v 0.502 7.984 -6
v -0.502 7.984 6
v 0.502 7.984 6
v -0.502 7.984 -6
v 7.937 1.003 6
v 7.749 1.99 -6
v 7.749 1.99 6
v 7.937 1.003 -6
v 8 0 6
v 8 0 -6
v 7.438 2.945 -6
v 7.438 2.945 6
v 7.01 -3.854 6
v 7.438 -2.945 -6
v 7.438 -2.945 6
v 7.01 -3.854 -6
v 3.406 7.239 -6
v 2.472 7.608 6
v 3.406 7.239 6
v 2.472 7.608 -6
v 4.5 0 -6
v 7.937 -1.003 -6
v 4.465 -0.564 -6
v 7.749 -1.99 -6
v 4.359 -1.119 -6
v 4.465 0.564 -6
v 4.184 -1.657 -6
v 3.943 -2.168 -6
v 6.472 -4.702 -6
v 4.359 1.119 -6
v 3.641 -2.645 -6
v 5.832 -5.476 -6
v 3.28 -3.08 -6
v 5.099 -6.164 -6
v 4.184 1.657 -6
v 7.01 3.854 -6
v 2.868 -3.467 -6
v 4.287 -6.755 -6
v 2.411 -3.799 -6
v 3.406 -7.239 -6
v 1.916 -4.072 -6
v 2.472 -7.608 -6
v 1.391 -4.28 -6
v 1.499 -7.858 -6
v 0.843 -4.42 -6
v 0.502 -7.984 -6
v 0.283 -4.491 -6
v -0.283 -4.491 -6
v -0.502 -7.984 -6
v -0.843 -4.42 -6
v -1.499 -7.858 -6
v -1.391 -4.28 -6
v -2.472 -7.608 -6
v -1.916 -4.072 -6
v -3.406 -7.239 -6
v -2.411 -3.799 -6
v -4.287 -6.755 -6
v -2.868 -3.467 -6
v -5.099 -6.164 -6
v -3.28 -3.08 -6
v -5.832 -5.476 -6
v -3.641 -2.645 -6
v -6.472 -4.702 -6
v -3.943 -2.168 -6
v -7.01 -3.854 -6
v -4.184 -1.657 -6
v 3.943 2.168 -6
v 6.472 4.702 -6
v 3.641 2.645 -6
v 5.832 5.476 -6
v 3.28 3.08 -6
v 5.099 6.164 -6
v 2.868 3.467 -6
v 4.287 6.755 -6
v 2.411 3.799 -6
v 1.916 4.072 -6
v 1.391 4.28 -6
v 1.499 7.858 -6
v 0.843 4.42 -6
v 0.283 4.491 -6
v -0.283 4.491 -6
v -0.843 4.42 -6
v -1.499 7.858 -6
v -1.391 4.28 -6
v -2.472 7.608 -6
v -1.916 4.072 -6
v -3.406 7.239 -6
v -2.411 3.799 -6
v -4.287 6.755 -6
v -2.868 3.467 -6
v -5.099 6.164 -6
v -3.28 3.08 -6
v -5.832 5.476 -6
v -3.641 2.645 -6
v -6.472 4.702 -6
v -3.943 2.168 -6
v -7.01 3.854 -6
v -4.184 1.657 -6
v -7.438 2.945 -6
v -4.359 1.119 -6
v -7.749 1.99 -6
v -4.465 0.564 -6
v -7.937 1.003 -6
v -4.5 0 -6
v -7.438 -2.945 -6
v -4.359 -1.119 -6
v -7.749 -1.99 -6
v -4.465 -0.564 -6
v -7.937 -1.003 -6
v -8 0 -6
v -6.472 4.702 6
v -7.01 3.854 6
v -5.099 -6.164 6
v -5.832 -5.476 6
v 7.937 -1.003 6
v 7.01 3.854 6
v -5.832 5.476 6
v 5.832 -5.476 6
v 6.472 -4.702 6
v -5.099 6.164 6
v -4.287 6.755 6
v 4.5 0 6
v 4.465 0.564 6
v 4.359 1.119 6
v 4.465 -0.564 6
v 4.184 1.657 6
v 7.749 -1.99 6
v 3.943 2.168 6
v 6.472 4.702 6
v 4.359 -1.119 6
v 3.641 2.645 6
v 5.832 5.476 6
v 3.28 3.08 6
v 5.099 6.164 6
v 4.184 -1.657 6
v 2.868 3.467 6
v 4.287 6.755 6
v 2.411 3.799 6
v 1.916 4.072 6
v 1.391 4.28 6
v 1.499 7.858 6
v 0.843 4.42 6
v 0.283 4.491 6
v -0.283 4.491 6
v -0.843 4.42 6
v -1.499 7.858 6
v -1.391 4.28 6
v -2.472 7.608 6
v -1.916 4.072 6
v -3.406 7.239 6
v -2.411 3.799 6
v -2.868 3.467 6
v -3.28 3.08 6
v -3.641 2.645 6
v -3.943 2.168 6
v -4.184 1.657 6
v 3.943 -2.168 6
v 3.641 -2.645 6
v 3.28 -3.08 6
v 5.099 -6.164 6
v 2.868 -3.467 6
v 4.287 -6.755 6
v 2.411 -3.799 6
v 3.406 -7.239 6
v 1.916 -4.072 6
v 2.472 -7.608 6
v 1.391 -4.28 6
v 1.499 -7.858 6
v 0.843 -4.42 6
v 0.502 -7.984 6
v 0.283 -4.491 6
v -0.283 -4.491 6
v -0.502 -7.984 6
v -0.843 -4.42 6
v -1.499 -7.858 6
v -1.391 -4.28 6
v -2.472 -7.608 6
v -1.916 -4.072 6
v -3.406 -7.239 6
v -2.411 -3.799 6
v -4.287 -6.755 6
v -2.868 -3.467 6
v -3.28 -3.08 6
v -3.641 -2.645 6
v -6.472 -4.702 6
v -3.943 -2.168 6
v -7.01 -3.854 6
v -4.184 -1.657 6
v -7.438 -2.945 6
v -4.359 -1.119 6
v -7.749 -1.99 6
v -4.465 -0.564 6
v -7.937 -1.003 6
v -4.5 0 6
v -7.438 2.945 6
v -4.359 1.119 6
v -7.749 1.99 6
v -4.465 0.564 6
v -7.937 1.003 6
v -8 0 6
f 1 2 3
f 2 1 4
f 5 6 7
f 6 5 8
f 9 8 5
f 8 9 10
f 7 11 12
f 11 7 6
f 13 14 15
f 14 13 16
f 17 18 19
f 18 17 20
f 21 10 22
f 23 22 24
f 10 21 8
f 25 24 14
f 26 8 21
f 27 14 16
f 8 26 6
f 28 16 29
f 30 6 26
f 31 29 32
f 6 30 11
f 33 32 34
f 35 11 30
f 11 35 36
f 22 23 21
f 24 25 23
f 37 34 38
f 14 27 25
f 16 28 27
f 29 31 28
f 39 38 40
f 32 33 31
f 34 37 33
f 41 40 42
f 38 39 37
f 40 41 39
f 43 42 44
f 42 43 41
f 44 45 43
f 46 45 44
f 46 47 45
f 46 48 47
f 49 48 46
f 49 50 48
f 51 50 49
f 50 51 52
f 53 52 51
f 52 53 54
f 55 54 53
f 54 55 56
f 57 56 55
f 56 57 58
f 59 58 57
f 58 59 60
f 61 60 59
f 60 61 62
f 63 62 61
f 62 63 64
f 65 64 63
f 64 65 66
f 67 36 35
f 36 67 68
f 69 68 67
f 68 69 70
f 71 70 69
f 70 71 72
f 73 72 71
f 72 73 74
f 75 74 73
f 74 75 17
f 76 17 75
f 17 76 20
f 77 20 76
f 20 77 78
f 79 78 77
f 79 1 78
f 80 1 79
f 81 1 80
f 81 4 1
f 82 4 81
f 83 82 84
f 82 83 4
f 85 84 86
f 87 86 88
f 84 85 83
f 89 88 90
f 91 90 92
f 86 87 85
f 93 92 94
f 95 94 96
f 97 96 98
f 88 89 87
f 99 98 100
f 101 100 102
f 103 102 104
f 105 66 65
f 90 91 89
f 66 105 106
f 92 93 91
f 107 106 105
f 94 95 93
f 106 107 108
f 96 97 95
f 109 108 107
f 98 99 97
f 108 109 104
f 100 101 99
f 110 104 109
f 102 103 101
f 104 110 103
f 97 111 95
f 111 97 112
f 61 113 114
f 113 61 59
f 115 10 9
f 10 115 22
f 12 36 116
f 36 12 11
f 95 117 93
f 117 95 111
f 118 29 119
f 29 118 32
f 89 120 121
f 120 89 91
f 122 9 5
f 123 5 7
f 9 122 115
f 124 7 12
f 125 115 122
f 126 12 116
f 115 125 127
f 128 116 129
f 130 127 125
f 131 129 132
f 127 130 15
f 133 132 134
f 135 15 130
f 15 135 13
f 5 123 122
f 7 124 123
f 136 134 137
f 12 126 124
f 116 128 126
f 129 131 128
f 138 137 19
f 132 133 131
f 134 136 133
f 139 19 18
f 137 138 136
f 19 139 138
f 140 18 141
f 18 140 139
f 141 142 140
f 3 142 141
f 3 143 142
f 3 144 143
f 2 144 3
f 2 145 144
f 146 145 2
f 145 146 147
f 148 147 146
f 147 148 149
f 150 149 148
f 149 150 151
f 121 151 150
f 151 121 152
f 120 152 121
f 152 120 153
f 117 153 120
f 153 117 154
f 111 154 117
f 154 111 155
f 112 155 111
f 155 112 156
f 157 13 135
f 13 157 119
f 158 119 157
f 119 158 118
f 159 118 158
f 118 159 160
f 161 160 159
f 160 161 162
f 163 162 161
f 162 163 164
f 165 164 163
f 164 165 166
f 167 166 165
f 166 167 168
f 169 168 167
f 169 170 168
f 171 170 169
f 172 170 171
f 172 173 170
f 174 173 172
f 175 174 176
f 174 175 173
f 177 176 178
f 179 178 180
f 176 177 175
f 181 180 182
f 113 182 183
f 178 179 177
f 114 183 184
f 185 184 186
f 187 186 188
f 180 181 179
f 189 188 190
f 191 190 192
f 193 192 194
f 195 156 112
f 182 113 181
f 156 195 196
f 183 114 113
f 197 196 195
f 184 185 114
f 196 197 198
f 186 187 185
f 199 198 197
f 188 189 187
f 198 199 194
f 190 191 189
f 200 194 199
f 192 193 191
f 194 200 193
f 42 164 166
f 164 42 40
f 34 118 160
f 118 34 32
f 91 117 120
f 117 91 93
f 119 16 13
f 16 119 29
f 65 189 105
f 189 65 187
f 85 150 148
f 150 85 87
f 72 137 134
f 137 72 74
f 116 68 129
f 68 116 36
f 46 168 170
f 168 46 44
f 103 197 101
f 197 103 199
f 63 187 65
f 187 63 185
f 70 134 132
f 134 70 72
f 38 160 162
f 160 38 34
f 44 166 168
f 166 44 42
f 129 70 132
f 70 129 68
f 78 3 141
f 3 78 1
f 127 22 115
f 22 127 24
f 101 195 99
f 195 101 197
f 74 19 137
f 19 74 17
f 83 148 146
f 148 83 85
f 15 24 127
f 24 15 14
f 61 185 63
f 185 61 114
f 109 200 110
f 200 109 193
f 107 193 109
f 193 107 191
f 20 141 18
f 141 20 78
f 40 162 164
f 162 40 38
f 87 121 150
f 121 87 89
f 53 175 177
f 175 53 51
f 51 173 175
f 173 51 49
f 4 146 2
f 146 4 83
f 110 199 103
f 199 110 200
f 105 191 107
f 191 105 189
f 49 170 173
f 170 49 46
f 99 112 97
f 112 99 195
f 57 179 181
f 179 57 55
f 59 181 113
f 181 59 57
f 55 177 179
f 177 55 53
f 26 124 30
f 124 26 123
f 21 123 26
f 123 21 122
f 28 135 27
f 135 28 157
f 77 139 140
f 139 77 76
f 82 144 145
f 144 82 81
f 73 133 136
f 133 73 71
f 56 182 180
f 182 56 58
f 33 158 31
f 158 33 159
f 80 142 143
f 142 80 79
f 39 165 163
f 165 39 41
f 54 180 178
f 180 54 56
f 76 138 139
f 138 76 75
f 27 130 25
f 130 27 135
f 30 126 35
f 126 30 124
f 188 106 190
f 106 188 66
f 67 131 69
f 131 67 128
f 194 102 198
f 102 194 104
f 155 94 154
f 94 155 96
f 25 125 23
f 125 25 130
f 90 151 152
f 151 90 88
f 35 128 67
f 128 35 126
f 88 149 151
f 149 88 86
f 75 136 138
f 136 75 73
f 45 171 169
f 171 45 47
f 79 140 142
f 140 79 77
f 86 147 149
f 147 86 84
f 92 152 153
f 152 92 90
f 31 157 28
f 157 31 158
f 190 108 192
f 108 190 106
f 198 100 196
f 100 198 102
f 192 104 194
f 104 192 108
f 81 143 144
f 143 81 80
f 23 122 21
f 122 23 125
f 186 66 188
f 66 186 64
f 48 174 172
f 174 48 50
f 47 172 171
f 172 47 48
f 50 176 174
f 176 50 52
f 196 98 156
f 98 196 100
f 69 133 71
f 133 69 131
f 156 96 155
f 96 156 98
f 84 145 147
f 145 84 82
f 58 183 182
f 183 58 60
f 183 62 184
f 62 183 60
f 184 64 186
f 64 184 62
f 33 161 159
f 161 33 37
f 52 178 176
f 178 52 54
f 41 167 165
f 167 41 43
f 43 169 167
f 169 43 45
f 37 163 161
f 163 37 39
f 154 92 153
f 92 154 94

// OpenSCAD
$fn = 50;


difference() {
	union() {
		translate(v = [0, 0, -6.0000000000]) {
			cylinder(h = 12, r = 8.0000000000);
		}
	}
	union() {
		translate(v = [0, 0, -100.0000000000]) {
			cylinder(h = 200, r = 4.5000000000);
		}
	}
}
